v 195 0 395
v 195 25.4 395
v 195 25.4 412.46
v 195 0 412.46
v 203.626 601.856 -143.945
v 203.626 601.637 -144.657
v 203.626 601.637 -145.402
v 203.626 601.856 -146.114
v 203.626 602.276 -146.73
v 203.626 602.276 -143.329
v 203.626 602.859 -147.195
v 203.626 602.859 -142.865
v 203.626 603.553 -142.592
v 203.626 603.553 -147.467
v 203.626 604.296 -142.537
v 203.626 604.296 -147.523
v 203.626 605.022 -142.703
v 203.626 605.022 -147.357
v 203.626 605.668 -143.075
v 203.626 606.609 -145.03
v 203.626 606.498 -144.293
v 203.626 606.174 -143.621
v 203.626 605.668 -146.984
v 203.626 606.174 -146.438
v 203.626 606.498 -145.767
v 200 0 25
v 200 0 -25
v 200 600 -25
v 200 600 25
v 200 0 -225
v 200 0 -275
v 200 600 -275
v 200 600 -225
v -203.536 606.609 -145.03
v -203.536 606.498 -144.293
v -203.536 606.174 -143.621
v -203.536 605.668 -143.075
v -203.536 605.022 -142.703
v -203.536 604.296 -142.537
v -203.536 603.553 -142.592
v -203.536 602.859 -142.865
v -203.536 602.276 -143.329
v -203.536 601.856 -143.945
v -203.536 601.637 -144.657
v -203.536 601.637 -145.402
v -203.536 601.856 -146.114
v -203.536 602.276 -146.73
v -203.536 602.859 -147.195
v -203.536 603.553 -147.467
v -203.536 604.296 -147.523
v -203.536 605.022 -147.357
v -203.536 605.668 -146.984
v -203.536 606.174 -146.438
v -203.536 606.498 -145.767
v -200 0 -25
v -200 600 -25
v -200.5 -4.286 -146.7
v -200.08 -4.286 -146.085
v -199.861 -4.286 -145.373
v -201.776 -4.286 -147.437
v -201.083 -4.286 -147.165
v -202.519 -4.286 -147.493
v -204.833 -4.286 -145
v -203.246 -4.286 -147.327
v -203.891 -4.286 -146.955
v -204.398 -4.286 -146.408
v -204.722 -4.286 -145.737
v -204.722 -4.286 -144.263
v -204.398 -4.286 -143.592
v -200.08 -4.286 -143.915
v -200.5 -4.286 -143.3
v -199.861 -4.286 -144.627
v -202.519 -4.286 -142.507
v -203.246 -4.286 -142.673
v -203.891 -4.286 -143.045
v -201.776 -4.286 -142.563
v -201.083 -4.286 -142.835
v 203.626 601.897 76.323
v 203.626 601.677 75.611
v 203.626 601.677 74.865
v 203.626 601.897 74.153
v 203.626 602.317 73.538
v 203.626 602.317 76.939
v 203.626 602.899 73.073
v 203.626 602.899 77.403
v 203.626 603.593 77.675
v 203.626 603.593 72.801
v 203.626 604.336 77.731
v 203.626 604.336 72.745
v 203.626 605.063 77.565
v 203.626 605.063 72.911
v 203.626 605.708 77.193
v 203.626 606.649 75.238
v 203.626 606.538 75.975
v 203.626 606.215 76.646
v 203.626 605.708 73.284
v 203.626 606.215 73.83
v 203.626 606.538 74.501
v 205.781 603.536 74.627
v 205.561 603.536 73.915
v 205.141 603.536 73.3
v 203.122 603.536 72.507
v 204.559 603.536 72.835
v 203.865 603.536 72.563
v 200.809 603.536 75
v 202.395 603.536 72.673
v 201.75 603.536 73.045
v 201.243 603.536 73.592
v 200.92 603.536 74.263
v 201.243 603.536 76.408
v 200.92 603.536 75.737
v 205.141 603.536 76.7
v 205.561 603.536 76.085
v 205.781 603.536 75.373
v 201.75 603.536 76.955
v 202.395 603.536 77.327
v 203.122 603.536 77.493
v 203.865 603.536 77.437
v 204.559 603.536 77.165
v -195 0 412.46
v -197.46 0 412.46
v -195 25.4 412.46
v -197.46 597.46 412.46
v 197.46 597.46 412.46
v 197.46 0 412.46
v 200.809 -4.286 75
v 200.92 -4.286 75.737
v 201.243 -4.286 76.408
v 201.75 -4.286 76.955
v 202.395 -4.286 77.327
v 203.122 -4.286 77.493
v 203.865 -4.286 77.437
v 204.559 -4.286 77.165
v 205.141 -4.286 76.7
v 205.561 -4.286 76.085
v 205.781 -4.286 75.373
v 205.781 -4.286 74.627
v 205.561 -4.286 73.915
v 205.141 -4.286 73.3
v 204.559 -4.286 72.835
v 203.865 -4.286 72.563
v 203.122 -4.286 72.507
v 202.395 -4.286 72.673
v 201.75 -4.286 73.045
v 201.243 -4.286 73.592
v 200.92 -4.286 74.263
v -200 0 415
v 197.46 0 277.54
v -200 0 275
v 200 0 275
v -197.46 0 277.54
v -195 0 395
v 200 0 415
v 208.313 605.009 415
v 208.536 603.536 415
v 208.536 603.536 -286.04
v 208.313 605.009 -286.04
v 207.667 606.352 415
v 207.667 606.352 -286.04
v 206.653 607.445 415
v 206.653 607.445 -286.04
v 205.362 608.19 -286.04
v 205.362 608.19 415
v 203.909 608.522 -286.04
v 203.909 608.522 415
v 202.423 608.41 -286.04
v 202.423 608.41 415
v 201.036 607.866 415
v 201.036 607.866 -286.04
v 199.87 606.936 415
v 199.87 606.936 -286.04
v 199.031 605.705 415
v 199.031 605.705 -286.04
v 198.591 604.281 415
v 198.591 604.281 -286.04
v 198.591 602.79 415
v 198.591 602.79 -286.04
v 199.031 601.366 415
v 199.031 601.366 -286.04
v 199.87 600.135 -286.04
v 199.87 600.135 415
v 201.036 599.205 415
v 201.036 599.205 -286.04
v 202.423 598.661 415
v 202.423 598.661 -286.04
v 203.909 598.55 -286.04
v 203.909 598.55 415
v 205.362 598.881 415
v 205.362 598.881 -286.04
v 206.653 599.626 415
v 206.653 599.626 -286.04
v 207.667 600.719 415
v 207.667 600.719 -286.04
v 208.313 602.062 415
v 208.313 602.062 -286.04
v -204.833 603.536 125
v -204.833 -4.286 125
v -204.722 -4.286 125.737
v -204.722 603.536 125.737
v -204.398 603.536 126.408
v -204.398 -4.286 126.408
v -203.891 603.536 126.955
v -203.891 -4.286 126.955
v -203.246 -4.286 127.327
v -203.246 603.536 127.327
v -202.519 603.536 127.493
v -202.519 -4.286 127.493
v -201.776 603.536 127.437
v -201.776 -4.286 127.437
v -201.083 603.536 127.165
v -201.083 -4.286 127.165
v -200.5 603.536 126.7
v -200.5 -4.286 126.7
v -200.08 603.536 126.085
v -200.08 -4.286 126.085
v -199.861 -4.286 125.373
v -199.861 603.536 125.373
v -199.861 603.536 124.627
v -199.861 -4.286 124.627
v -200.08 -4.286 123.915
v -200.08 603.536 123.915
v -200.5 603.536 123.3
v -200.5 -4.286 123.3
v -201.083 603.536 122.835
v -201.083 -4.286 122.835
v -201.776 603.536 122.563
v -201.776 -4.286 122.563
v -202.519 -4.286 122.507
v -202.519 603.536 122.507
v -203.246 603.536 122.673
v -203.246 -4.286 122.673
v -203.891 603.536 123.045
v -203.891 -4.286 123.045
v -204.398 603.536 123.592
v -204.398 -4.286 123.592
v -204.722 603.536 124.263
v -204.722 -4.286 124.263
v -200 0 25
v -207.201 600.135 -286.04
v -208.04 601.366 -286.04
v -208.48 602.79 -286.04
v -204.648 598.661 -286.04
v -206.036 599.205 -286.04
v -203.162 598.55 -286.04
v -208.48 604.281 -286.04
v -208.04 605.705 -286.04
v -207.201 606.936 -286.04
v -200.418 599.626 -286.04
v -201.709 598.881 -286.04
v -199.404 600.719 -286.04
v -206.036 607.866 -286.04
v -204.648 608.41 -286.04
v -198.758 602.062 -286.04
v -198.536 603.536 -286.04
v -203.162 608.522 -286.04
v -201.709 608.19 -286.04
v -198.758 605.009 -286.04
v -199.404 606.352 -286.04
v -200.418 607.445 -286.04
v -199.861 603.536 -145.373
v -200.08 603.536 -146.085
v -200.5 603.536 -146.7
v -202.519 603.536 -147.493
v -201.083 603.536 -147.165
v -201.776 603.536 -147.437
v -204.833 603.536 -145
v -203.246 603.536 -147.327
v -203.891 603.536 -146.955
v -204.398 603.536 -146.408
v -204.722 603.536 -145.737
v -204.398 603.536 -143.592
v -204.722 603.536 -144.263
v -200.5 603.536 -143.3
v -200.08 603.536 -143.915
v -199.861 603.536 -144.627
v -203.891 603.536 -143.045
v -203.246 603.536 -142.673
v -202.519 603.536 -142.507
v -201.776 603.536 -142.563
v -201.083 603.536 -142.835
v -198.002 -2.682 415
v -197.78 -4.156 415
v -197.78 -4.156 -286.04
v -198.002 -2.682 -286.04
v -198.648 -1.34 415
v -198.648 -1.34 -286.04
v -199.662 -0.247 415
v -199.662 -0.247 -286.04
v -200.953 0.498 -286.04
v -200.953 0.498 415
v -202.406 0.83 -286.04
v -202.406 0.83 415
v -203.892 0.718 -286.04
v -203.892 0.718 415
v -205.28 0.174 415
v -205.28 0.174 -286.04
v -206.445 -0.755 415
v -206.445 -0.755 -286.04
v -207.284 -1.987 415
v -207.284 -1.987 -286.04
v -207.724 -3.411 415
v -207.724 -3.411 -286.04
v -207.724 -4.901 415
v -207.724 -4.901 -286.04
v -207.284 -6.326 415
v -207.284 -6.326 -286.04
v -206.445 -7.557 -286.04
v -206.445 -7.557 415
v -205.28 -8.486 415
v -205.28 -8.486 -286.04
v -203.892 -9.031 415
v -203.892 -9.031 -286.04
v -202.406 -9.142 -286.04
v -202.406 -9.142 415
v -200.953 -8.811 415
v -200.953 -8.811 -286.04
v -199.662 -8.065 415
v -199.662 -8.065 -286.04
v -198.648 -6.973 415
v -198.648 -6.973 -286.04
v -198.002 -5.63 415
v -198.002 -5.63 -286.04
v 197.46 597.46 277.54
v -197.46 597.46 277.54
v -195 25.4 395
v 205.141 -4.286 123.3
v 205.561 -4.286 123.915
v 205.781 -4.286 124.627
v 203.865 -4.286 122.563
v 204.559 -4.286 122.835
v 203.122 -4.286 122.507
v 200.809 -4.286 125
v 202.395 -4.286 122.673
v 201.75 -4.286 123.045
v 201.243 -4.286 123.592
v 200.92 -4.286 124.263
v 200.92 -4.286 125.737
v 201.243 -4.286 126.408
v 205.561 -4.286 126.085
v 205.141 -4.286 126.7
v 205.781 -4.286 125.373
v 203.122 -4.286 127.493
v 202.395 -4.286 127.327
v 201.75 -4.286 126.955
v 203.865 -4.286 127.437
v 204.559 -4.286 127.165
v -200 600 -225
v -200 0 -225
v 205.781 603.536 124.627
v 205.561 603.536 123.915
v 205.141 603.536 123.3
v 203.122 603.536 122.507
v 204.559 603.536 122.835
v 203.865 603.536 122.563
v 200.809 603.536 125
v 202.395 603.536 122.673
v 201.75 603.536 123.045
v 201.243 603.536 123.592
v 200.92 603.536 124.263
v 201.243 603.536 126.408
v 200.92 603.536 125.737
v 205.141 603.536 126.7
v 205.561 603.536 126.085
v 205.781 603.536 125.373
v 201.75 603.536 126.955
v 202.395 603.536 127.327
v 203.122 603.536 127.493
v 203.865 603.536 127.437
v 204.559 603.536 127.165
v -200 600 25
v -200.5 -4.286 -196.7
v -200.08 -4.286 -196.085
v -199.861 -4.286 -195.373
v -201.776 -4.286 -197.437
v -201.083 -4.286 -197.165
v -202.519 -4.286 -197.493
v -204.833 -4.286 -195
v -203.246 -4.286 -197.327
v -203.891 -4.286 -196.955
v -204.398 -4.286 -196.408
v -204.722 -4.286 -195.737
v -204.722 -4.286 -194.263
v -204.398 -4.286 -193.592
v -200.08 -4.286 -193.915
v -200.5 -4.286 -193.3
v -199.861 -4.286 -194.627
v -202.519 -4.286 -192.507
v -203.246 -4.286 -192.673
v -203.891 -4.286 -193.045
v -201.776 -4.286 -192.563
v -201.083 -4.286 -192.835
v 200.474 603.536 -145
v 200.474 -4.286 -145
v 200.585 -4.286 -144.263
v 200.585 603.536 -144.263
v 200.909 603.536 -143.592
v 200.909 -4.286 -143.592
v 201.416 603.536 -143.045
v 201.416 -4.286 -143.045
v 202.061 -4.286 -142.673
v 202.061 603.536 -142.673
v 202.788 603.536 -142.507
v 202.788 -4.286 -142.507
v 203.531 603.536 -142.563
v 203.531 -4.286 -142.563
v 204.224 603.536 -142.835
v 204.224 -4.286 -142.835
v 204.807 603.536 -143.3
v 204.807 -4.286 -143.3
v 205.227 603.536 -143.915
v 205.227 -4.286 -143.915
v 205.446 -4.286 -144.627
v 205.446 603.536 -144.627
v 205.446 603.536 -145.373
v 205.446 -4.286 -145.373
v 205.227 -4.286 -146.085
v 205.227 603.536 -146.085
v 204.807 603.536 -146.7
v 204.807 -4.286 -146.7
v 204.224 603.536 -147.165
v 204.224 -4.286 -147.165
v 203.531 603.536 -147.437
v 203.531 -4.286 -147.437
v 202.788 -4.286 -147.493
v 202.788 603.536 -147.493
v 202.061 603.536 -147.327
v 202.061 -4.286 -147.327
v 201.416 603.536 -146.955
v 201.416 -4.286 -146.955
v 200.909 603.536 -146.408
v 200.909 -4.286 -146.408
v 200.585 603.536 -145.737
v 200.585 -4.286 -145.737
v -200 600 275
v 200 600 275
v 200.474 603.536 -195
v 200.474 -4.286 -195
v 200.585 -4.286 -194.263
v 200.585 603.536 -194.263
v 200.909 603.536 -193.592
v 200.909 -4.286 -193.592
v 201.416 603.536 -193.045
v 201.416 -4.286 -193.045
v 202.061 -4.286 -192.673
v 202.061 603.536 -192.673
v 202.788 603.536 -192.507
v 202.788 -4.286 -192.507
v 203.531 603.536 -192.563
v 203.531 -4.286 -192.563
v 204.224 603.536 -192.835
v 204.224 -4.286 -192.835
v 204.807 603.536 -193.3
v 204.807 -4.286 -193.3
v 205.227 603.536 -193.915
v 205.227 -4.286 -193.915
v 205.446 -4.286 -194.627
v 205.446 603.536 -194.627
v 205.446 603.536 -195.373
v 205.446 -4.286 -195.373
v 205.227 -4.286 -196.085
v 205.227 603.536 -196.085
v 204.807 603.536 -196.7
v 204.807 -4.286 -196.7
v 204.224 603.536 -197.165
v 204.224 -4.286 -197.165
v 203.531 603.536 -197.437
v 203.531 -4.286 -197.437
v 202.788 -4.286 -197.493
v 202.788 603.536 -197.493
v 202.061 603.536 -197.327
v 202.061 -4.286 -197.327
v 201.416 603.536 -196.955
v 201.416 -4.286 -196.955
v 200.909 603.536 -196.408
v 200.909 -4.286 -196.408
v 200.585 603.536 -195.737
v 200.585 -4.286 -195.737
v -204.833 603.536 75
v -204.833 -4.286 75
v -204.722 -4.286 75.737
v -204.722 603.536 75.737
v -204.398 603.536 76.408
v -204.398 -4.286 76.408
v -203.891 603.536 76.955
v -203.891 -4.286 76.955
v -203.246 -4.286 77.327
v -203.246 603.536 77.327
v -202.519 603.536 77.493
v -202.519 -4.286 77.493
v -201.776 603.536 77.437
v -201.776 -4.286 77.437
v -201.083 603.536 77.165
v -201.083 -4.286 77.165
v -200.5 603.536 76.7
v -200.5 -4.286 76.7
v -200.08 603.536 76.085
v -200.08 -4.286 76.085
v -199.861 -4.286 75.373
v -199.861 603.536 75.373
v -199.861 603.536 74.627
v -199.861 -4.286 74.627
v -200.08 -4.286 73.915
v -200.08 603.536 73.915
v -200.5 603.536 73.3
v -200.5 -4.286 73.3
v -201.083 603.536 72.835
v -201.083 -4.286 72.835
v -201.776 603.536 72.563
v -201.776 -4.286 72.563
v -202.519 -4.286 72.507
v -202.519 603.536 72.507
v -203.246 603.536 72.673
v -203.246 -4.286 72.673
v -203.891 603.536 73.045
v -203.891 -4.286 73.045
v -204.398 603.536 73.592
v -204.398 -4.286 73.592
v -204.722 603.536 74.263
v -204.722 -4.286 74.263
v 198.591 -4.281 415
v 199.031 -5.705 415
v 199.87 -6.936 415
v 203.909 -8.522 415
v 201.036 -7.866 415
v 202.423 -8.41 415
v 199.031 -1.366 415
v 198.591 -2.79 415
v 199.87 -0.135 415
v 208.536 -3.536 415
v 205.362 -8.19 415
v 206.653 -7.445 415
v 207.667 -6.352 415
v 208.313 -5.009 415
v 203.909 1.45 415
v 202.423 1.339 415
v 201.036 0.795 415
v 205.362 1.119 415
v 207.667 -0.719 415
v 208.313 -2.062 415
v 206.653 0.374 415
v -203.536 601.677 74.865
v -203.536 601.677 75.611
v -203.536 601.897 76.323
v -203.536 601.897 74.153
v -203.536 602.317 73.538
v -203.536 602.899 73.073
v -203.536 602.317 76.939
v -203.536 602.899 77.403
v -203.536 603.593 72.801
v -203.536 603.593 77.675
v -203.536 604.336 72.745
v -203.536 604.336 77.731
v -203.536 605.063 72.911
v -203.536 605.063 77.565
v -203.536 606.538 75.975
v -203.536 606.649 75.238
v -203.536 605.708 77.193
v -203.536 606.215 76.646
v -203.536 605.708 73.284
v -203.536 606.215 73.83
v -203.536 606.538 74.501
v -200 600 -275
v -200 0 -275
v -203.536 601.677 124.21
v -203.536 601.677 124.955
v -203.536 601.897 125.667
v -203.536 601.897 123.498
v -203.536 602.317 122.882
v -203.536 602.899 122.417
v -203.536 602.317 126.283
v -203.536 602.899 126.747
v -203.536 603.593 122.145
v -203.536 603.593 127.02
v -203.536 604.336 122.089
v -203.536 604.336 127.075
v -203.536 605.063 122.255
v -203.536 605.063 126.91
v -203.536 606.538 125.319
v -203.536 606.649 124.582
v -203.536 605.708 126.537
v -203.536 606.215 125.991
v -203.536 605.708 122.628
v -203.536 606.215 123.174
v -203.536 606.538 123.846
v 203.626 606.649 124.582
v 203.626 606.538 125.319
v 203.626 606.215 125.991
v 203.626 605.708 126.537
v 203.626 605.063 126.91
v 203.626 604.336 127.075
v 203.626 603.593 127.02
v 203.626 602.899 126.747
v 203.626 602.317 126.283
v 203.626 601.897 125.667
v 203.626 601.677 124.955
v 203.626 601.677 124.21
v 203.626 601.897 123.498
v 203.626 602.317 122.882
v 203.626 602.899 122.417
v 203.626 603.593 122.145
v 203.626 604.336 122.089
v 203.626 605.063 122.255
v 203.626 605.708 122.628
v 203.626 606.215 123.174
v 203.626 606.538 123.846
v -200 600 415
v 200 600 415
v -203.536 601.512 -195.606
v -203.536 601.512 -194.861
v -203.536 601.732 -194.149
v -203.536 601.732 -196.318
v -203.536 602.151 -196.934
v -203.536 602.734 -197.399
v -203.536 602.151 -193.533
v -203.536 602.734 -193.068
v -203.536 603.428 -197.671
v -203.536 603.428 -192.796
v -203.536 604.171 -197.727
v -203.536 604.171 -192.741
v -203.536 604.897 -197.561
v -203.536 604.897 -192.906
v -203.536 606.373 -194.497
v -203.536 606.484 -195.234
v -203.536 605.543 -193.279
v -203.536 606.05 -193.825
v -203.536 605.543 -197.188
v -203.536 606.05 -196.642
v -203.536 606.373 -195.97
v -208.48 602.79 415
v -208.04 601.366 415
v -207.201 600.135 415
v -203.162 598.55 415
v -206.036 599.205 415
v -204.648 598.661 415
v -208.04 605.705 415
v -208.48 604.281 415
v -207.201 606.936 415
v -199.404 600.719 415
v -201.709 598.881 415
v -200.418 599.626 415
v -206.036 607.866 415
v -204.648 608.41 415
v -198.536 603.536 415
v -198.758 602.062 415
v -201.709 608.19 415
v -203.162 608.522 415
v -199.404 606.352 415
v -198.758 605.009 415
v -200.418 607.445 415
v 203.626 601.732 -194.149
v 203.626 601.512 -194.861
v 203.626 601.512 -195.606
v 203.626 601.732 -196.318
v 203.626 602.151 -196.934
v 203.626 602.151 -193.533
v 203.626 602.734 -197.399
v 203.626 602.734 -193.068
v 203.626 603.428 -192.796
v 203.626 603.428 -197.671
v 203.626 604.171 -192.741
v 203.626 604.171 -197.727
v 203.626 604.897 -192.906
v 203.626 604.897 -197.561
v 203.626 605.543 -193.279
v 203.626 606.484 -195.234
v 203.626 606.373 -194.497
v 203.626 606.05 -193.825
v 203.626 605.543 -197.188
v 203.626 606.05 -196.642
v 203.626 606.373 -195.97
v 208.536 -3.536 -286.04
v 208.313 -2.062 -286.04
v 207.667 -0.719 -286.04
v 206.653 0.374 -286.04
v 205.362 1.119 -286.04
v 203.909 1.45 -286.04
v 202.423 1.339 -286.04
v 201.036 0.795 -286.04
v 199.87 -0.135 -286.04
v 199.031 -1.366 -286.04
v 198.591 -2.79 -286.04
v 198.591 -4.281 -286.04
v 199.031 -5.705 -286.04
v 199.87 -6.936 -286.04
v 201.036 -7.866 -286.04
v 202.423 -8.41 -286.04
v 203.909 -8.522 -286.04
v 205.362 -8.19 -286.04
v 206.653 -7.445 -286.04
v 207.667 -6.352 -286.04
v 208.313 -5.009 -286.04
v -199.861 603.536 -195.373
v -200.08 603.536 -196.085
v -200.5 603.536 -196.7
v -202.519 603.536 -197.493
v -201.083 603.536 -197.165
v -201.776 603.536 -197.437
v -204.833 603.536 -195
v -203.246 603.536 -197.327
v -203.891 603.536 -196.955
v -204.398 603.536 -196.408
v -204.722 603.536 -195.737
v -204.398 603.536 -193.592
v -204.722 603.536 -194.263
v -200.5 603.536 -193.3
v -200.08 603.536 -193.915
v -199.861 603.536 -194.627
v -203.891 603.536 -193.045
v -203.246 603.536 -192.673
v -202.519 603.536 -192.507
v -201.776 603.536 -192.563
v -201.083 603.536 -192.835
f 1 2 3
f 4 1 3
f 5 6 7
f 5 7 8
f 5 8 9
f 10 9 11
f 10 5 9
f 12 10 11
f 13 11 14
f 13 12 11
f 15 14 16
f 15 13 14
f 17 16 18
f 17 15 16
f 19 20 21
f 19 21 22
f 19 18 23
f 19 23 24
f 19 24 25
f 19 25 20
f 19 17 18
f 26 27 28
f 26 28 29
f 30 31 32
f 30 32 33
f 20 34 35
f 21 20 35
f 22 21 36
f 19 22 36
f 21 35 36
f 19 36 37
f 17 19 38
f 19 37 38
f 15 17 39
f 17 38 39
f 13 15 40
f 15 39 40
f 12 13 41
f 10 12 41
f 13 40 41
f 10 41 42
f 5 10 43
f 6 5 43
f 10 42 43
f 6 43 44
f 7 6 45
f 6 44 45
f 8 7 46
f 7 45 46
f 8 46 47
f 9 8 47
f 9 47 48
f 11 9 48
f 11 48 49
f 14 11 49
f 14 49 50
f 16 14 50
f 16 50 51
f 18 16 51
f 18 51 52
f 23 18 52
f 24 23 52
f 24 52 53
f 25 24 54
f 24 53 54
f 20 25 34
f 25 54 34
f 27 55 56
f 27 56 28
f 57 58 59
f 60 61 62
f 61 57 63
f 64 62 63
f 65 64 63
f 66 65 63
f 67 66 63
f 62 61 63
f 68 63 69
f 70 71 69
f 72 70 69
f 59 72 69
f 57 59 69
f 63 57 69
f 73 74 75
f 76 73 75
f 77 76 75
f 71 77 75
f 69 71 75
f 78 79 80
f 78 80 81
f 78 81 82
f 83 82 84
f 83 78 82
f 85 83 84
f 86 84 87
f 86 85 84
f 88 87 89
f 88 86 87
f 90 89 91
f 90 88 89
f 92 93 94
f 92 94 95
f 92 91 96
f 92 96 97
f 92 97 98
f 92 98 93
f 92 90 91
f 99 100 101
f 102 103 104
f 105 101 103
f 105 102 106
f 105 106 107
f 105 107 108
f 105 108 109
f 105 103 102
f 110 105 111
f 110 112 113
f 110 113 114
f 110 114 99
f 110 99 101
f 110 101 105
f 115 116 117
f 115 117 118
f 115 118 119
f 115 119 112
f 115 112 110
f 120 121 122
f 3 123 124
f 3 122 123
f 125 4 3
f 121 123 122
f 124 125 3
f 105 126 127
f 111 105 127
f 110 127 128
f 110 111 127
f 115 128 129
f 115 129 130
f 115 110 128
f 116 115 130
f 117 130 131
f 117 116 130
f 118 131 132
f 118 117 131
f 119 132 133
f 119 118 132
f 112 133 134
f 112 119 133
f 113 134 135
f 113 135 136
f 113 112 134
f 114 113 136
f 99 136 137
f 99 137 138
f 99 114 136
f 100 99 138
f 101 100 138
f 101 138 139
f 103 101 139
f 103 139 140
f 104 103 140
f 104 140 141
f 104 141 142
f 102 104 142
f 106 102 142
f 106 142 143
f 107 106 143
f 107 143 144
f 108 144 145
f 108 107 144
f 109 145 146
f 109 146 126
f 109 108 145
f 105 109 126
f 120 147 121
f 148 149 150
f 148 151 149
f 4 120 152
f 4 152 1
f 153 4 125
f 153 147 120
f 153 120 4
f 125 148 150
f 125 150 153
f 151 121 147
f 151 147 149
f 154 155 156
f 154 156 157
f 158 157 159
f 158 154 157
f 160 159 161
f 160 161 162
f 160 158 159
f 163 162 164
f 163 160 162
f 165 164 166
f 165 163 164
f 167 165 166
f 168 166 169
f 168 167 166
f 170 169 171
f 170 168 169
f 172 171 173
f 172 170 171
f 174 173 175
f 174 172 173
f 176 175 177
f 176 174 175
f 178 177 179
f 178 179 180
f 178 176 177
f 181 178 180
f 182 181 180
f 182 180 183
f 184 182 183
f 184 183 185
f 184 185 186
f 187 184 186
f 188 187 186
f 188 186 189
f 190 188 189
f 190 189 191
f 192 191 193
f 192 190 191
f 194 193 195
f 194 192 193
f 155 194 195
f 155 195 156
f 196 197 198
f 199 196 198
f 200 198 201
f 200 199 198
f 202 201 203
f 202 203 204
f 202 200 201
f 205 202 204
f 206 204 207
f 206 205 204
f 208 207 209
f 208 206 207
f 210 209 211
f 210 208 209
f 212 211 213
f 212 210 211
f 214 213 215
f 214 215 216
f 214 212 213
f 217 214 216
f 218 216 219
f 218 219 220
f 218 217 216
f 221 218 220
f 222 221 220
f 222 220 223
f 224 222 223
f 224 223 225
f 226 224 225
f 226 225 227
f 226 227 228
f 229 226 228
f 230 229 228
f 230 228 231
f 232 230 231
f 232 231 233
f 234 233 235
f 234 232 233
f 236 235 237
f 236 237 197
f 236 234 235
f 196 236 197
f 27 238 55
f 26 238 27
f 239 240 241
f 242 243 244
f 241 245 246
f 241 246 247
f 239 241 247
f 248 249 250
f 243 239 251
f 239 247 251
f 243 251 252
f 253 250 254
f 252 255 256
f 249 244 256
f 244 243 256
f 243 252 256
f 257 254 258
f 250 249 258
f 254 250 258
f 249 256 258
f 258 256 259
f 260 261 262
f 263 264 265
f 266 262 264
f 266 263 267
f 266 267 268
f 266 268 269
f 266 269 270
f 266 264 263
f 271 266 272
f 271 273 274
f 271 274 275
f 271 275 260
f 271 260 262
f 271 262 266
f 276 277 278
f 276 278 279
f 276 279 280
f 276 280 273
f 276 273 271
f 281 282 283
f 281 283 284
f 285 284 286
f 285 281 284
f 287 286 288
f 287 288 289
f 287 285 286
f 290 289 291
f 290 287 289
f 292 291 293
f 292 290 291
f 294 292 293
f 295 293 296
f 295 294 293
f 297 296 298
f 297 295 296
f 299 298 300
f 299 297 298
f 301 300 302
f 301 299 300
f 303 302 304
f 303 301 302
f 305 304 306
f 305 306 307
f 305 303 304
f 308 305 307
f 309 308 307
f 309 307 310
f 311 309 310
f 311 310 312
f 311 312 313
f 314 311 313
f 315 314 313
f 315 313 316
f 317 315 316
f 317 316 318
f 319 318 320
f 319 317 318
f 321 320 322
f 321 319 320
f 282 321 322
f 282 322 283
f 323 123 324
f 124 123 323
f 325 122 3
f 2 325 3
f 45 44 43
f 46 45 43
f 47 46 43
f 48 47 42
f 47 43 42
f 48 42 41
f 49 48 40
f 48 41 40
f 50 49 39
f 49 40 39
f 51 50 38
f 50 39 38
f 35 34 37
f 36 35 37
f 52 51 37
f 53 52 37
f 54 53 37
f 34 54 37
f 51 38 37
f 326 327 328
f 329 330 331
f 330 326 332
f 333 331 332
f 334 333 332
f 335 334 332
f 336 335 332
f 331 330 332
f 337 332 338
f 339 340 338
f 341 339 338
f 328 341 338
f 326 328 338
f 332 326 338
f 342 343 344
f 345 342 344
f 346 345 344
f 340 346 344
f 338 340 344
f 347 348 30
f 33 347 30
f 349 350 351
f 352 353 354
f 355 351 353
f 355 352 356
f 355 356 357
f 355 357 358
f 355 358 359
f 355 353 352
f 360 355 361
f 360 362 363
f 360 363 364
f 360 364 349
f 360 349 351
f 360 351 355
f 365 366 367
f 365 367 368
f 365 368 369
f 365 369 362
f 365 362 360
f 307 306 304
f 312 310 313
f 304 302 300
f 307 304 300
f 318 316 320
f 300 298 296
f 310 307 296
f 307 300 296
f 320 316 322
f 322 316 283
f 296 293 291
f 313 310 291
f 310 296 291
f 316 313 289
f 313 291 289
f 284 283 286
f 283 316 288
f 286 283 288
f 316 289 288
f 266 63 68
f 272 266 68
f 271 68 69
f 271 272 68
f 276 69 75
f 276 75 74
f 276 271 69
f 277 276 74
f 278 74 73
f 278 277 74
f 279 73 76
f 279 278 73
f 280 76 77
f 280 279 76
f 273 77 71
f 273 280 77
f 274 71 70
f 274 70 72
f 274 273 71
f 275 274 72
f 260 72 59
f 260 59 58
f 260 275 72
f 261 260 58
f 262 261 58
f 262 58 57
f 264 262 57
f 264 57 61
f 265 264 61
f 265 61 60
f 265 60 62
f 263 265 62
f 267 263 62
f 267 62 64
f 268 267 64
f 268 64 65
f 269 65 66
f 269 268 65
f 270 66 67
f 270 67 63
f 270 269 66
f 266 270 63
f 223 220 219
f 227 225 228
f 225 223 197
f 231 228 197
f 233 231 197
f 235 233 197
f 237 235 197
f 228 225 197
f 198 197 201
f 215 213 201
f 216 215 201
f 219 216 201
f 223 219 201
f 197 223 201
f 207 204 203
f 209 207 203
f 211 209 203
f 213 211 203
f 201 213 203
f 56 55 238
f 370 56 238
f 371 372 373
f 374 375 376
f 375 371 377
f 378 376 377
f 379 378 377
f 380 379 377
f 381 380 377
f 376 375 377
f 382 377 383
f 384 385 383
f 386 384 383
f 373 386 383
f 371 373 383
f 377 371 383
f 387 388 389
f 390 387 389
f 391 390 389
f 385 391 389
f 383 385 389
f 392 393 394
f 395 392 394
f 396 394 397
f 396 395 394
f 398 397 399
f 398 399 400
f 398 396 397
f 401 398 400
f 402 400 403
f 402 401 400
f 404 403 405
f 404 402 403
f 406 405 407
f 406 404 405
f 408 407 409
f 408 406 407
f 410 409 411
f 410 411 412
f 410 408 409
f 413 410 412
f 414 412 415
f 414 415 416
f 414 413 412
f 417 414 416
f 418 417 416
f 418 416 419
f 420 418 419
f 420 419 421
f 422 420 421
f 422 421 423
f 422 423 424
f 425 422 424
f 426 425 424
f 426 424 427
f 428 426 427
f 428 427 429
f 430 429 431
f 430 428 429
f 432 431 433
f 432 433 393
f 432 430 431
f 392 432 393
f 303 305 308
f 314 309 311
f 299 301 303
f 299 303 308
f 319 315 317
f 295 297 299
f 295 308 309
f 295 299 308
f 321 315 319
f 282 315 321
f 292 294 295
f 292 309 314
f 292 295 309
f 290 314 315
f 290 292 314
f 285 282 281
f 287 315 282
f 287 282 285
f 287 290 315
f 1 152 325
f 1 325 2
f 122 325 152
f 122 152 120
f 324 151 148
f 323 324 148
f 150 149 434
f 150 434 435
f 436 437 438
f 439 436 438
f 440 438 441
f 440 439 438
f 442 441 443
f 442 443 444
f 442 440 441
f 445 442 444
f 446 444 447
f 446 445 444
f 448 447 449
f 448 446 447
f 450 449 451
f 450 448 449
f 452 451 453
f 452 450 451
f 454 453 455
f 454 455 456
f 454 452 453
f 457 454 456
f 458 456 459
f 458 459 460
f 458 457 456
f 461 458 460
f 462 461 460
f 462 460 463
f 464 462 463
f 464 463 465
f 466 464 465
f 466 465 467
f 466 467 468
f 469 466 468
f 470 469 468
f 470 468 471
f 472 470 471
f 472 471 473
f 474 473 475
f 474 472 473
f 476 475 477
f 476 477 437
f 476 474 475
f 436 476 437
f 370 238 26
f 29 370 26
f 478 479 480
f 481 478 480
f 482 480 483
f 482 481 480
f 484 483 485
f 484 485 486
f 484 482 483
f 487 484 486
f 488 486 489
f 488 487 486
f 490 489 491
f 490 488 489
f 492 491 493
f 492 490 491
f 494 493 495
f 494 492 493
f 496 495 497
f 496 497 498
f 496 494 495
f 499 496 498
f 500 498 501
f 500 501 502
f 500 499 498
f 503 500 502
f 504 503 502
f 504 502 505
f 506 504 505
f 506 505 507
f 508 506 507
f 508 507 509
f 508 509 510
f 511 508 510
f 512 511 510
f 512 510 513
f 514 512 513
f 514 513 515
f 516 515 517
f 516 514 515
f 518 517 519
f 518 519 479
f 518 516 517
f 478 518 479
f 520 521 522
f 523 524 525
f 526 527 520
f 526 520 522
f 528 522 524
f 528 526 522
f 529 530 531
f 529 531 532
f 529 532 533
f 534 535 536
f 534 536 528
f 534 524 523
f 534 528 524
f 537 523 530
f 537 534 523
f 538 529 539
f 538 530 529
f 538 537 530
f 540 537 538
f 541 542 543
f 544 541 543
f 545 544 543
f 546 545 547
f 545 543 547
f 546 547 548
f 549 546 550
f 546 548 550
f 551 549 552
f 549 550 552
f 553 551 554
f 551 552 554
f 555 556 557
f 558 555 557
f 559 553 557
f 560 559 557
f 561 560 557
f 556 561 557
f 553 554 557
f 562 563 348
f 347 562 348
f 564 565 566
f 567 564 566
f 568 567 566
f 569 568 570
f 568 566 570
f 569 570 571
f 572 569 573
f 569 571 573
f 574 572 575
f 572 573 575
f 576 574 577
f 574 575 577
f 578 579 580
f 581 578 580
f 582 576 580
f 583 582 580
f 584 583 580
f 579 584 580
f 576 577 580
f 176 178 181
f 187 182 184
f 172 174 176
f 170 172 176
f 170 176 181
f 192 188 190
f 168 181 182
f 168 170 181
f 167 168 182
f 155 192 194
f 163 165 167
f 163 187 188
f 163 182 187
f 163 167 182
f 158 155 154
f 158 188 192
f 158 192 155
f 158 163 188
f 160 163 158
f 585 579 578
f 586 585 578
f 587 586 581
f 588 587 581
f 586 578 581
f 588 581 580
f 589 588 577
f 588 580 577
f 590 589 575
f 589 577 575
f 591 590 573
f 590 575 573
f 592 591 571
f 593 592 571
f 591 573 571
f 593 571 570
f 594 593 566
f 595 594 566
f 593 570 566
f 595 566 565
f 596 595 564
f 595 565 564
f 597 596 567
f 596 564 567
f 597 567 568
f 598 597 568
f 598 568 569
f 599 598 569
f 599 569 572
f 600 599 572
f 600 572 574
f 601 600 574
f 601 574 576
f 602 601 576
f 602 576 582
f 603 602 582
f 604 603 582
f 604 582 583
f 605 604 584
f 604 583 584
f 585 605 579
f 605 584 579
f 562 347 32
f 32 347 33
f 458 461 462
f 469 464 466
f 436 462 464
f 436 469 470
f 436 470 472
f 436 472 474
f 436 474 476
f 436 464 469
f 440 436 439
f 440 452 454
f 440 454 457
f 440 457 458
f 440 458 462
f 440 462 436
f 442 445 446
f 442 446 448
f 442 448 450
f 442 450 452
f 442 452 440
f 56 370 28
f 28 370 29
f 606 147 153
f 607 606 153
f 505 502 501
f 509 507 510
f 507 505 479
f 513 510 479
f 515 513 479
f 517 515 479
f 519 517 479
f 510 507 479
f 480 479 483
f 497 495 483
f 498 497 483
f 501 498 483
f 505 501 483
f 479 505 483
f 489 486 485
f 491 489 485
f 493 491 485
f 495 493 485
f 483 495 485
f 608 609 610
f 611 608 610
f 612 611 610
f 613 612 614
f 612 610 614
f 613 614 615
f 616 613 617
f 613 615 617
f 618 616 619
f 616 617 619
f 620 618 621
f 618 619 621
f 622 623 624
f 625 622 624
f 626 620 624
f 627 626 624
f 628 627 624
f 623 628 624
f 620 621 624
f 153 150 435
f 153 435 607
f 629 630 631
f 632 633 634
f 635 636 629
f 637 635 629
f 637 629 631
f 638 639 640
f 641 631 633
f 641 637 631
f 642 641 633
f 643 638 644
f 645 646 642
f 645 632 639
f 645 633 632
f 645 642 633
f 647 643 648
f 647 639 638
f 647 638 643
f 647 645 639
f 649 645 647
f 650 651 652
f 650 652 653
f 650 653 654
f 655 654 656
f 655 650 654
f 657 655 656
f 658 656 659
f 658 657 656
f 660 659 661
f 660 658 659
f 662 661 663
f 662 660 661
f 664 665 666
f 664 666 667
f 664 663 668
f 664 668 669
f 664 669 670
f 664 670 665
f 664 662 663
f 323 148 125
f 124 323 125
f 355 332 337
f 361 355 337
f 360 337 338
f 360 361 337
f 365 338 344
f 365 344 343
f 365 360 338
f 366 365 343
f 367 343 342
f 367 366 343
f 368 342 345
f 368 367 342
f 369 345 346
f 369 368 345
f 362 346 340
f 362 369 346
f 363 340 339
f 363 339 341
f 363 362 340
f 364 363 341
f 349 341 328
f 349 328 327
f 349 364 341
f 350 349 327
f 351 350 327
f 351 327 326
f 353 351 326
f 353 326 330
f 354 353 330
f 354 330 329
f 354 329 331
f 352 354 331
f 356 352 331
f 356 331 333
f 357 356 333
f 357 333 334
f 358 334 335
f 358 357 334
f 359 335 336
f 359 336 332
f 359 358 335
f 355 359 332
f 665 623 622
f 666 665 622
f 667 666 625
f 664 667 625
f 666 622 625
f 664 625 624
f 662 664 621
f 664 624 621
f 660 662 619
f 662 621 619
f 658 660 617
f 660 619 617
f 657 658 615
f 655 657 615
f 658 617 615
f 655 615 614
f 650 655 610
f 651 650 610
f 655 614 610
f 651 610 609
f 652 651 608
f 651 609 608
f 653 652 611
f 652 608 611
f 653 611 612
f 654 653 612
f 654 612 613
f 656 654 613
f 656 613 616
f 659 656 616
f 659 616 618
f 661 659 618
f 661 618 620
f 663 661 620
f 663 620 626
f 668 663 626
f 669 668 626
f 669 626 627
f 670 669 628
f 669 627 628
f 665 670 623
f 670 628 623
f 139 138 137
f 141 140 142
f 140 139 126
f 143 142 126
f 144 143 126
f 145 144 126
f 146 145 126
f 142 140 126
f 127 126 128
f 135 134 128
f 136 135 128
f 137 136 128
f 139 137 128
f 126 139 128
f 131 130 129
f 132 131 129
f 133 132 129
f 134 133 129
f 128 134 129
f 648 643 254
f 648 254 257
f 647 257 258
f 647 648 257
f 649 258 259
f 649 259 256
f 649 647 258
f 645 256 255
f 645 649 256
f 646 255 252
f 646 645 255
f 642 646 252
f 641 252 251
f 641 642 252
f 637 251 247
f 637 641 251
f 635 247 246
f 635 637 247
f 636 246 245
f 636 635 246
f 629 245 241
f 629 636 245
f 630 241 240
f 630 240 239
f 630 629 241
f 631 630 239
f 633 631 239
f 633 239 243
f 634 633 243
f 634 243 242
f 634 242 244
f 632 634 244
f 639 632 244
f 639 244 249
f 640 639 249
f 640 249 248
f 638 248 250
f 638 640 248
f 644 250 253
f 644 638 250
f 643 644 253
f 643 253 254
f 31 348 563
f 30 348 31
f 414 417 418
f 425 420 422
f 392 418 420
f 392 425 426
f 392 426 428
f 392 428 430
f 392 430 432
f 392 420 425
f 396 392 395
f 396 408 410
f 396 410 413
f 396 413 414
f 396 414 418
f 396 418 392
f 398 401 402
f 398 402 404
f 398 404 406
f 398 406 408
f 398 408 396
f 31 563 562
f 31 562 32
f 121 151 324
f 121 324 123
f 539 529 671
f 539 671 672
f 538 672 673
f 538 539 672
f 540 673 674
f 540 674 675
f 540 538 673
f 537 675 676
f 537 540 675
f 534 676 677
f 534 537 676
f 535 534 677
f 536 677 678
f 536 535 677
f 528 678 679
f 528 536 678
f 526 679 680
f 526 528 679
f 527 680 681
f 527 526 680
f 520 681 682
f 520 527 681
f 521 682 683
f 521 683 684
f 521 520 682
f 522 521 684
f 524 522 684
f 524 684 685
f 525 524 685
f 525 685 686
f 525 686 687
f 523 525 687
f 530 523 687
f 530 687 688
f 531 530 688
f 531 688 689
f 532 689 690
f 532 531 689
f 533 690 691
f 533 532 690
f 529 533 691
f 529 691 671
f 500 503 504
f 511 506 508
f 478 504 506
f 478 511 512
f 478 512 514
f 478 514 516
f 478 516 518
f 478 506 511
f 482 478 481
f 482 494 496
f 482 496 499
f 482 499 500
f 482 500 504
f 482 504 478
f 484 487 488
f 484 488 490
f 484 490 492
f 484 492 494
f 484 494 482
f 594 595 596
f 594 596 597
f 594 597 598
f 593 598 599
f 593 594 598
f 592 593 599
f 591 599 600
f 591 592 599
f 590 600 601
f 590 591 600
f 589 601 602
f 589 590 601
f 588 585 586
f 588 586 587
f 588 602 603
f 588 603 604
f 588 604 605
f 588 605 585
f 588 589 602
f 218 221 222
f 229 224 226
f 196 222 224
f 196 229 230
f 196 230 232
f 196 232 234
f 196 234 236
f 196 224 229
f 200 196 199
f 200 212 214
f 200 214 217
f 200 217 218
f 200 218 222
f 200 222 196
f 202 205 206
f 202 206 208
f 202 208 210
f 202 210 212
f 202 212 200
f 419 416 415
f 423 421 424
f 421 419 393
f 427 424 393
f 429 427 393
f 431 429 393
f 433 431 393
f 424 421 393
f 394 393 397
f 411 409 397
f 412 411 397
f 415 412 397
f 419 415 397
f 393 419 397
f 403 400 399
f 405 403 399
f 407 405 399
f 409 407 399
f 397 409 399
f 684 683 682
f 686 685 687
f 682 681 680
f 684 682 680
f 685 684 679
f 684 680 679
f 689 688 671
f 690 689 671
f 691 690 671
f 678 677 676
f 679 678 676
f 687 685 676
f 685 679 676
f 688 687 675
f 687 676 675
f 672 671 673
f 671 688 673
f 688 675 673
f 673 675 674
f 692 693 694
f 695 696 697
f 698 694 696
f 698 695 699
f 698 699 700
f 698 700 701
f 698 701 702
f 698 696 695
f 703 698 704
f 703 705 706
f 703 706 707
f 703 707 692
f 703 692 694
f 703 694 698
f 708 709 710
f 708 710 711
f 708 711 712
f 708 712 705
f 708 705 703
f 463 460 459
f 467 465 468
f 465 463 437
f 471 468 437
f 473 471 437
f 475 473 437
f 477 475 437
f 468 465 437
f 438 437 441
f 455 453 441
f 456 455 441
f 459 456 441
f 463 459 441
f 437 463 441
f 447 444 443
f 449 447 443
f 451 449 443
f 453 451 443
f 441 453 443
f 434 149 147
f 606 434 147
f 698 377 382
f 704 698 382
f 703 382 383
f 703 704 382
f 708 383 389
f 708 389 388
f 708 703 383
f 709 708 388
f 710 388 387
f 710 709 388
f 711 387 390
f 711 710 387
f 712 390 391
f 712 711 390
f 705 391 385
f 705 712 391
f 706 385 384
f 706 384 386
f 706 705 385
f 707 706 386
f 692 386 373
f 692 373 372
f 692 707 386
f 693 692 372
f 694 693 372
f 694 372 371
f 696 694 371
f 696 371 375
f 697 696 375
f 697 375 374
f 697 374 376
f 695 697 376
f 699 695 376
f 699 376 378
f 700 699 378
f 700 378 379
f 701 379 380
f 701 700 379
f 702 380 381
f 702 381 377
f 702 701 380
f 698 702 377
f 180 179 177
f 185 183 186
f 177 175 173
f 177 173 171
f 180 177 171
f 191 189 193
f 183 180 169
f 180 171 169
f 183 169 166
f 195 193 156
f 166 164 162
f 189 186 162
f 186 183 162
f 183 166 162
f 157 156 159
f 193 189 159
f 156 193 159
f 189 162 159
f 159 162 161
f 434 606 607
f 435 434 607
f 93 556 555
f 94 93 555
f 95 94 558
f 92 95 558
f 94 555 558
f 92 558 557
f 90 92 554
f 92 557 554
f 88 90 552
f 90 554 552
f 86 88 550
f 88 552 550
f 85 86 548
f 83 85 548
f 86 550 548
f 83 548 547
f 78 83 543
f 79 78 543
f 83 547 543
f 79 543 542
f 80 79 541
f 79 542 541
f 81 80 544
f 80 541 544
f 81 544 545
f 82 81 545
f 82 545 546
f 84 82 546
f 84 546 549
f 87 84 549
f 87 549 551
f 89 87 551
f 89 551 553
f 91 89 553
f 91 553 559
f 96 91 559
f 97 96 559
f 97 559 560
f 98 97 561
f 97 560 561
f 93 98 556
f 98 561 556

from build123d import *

# Parameters (mm, degrees)
F0_W      = 400
F0_H      = 140
F1_DEPTH  = 600
F0_H_2    = 50
F2_R      = 5
F3_DEPTH  = 701.04
F5_T      = -2.54
F4_W      = 390
F4_H      = 20
F6_DEPTH  = 25.4
F8_R      = 2.5
F9_DEPTH  = 607.822
F11_R     = 2.5
F12_DEPTH = 407.162


with BuildPart() as f1:
    # F0 (on Front) → F1 (new body)
    with BuildSketch(Plane.XZ):
        with Locations((0, 345)):
            Rectangle(F0_W, F0_H)
    extrude(amount=-F1_DEPTH)

    # F5
    f5_openings = [f1.faces().sort_by_distance(p)[0] for p in [
        (0, 0, 345),
    ]]
    offset(amount=F5_T, openings=f5_openings)

    # F4 (on face) → F6 (join)
    with BuildSketch(Plane.XZ):
        with Locations((0, 405)):
            Rectangle(F4_W, F4_H)
    extrude(amount=-F6_DEPTH)


with BuildPart() as f1b:
    # F0 (on Front) → F1, piece 2 (new body)
    with BuildSketch(Plane.XZ):
        Rectangle(F0_W, F0_H_2)
    extrude(amount=-F1_DEPTH)


with BuildPart() as f1c:
    # F0 (on Front) → F1, piece 3 (new body)
    with BuildSketch(Plane.XZ):
        with Locations((0, -250)):
            Rectangle(F0_W, F0_H_2)
    extrude(amount=-F1_DEPTH)


with BuildPart() as f3:
    # F2 (on face) → F3 (new body)
    with BuildSketch(Plane.XY.offset(415)):
        with Locations((203.5355339059, -3.5355339059)):
            Circle(F2_R)
    extrude(amount=-F3_DEPTH)


with BuildPart() as f3b:
    # F2 (on face) → F3, piece 2 (new body)
    with BuildSketch(Plane.XY.offset(415)):
        with Locations((203.5355339059, 603.5355339059)):
            Circle(F2_R)
    extrude(amount=-F3_DEPTH)


with BuildPart() as f3c:
    # F2 (on face) → F3, piece 3 (new body)
    with BuildSketch(Plane.XY.offset(415)):
        with Locations((-203.5355339059, 603.5355339059)):
            Circle(F2_R)
    extrude(amount=-F3_DEPTH)


with BuildPart() as f3d:
    # F2 (on face) → F3, piece 4 (new body)
    with BuildSketch(Plane.XY.offset(415)):
        with Locations((-202.7795129572, -4.156237207)):
            Circle(F2_R)
    extrude(amount=-F3_DEPTH)


with BuildPart() as f9:
    # F8 (on face) → F9 (new body)
    with BuildSketch(Plane(origin=(0, 603.5355339059, 0), x_dir=(-1, 0, 0), z_dir=(0, 1, 0))):
        with Locations((202.33258605, 125)):
            Circle(F8_R)
    extrude(amount=-F9_DEPTH)


with BuildPart() as f9b:
    # F8 (on face) → F9, piece 2 (new body)
    with BuildSketch(Plane(origin=(0, 603.5355339059, 0), x_dir=(-1, 0, 0), z_dir=(0, 1, 0))):
        with Locations((202.33258605, 75)):
            Circle(F8_R)
    extrude(amount=-F9_DEPTH)


with BuildPart() as f9c:
    # F8 (on face) → F9, piece 3 (new body)
    with BuildSketch(Plane(origin=(0, 603.5355339059, 0), x_dir=(-1, 0, 0), z_dir=(0, 1, 0))):
        with Locations((-203.3087313175, 125)):
            Circle(F8_R)
    extrude(amount=-F9_DEPTH)


with BuildPart() as f9d:
    # F8 (on face) → F9, piece 4 (new body)
    with BuildSketch(Plane(origin=(0, 603.5355339059, 0), x_dir=(-1, 0, 0), z_dir=(0, 1, 0))):
        with Locations((-203.3087313175, 75)):
            Circle(F8_R)
    extrude(amount=-F9_DEPTH)


with BuildPart() as f9e:
    # F8 (on face) → F9, piece 5 (new body)
    with BuildSketch(Plane(origin=(0, 603.5355339059, 0), x_dir=(-1, 0, 0), z_dir=(0, 1, 0))):
        with Locations((202.33258605, -145)):
            Circle(F8_R)
    extrude(amount=-F9_DEPTH)


with BuildPart() as f9f:
    # F8 (on face) → F9, piece 6 (new body)
    with BuildSketch(Plane(origin=(0, 603.5355339059, 0), x_dir=(-1, 0, 0), z_dir=(0, 1, 0))):
        with Locations((202.33258605, -195)):
            Circle(F8_R)
    extrude(amount=-F9_DEPTH)


with BuildPart() as f9g:
    # F8 (on face) → F9, piece 7 (new body)
    with BuildSketch(Plane(origin=(0, 603.5355339059, 0), x_dir=(-1, 0, 0), z_dir=(0, 1, 0))):
        with Locations((-202.9743790627, -145)):
            Circle(F8_R)
    extrude(amount=-F9_DEPTH)


with BuildPart() as f9h:
    # F8 (on face) → F9, piece 8 (new body)
    with BuildSketch(Plane(origin=(0, 603.5355339059, 0), x_dir=(-1, 0, 0), z_dir=(0, 1, 0))):
        with Locations((-202.9743790627, -195)):
            Circle(F8_R)
    extrude(amount=-F9_DEPTH)


with BuildPart() as f12:
    # F11 (on face) → F12 (new body)
    with BuildSketch(Plane.YZ.offset(-203.5355339059)):
        with Locations((604.149222374, 124.5824322104)):
            Circle(F11_R)
    extrude(amount=F12_DEPTH)


with BuildPart() as f12b:
    # F11 (on face) → F12, piece 2 (new body)
    with BuildSketch(Plane.YZ.offset(-203.5355339059)):
        with Locations((604.149222374, 75.2380788326)):
            Circle(F11_R)
    extrude(amount=F12_DEPTH)


with BuildPart() as f12c:
    # F11 (on face) → F12, piece 3 (new body)
    with BuildSketch(Plane.YZ.offset(-203.5355339059)):
        with Locations((604.1088700294, -145.0297236443)):
            Circle(F11_R)
    extrude(amount=F12_DEPTH)


with BuildPart() as f12d:
    # F11 (on face) → F12, piece 4 (new body)
    with BuildSketch(Plane.YZ.offset(-203.5355339059)):
        with Locations((603.9840579033, -195.2335387468)):
            Circle(F11_R)
    extrude(amount=F12_DEPTH)


solid = Compound([f1.part, f1b.part, f1c.part, f3.part, f3b.part, f3c.part, f3d.part, f9.part, f9b.part, f9c.part, f9d.part, f9e.part, f9f.part, f9g.part, f9h.part, f12.part, f12b.part, f12c.part, f12d.part])
